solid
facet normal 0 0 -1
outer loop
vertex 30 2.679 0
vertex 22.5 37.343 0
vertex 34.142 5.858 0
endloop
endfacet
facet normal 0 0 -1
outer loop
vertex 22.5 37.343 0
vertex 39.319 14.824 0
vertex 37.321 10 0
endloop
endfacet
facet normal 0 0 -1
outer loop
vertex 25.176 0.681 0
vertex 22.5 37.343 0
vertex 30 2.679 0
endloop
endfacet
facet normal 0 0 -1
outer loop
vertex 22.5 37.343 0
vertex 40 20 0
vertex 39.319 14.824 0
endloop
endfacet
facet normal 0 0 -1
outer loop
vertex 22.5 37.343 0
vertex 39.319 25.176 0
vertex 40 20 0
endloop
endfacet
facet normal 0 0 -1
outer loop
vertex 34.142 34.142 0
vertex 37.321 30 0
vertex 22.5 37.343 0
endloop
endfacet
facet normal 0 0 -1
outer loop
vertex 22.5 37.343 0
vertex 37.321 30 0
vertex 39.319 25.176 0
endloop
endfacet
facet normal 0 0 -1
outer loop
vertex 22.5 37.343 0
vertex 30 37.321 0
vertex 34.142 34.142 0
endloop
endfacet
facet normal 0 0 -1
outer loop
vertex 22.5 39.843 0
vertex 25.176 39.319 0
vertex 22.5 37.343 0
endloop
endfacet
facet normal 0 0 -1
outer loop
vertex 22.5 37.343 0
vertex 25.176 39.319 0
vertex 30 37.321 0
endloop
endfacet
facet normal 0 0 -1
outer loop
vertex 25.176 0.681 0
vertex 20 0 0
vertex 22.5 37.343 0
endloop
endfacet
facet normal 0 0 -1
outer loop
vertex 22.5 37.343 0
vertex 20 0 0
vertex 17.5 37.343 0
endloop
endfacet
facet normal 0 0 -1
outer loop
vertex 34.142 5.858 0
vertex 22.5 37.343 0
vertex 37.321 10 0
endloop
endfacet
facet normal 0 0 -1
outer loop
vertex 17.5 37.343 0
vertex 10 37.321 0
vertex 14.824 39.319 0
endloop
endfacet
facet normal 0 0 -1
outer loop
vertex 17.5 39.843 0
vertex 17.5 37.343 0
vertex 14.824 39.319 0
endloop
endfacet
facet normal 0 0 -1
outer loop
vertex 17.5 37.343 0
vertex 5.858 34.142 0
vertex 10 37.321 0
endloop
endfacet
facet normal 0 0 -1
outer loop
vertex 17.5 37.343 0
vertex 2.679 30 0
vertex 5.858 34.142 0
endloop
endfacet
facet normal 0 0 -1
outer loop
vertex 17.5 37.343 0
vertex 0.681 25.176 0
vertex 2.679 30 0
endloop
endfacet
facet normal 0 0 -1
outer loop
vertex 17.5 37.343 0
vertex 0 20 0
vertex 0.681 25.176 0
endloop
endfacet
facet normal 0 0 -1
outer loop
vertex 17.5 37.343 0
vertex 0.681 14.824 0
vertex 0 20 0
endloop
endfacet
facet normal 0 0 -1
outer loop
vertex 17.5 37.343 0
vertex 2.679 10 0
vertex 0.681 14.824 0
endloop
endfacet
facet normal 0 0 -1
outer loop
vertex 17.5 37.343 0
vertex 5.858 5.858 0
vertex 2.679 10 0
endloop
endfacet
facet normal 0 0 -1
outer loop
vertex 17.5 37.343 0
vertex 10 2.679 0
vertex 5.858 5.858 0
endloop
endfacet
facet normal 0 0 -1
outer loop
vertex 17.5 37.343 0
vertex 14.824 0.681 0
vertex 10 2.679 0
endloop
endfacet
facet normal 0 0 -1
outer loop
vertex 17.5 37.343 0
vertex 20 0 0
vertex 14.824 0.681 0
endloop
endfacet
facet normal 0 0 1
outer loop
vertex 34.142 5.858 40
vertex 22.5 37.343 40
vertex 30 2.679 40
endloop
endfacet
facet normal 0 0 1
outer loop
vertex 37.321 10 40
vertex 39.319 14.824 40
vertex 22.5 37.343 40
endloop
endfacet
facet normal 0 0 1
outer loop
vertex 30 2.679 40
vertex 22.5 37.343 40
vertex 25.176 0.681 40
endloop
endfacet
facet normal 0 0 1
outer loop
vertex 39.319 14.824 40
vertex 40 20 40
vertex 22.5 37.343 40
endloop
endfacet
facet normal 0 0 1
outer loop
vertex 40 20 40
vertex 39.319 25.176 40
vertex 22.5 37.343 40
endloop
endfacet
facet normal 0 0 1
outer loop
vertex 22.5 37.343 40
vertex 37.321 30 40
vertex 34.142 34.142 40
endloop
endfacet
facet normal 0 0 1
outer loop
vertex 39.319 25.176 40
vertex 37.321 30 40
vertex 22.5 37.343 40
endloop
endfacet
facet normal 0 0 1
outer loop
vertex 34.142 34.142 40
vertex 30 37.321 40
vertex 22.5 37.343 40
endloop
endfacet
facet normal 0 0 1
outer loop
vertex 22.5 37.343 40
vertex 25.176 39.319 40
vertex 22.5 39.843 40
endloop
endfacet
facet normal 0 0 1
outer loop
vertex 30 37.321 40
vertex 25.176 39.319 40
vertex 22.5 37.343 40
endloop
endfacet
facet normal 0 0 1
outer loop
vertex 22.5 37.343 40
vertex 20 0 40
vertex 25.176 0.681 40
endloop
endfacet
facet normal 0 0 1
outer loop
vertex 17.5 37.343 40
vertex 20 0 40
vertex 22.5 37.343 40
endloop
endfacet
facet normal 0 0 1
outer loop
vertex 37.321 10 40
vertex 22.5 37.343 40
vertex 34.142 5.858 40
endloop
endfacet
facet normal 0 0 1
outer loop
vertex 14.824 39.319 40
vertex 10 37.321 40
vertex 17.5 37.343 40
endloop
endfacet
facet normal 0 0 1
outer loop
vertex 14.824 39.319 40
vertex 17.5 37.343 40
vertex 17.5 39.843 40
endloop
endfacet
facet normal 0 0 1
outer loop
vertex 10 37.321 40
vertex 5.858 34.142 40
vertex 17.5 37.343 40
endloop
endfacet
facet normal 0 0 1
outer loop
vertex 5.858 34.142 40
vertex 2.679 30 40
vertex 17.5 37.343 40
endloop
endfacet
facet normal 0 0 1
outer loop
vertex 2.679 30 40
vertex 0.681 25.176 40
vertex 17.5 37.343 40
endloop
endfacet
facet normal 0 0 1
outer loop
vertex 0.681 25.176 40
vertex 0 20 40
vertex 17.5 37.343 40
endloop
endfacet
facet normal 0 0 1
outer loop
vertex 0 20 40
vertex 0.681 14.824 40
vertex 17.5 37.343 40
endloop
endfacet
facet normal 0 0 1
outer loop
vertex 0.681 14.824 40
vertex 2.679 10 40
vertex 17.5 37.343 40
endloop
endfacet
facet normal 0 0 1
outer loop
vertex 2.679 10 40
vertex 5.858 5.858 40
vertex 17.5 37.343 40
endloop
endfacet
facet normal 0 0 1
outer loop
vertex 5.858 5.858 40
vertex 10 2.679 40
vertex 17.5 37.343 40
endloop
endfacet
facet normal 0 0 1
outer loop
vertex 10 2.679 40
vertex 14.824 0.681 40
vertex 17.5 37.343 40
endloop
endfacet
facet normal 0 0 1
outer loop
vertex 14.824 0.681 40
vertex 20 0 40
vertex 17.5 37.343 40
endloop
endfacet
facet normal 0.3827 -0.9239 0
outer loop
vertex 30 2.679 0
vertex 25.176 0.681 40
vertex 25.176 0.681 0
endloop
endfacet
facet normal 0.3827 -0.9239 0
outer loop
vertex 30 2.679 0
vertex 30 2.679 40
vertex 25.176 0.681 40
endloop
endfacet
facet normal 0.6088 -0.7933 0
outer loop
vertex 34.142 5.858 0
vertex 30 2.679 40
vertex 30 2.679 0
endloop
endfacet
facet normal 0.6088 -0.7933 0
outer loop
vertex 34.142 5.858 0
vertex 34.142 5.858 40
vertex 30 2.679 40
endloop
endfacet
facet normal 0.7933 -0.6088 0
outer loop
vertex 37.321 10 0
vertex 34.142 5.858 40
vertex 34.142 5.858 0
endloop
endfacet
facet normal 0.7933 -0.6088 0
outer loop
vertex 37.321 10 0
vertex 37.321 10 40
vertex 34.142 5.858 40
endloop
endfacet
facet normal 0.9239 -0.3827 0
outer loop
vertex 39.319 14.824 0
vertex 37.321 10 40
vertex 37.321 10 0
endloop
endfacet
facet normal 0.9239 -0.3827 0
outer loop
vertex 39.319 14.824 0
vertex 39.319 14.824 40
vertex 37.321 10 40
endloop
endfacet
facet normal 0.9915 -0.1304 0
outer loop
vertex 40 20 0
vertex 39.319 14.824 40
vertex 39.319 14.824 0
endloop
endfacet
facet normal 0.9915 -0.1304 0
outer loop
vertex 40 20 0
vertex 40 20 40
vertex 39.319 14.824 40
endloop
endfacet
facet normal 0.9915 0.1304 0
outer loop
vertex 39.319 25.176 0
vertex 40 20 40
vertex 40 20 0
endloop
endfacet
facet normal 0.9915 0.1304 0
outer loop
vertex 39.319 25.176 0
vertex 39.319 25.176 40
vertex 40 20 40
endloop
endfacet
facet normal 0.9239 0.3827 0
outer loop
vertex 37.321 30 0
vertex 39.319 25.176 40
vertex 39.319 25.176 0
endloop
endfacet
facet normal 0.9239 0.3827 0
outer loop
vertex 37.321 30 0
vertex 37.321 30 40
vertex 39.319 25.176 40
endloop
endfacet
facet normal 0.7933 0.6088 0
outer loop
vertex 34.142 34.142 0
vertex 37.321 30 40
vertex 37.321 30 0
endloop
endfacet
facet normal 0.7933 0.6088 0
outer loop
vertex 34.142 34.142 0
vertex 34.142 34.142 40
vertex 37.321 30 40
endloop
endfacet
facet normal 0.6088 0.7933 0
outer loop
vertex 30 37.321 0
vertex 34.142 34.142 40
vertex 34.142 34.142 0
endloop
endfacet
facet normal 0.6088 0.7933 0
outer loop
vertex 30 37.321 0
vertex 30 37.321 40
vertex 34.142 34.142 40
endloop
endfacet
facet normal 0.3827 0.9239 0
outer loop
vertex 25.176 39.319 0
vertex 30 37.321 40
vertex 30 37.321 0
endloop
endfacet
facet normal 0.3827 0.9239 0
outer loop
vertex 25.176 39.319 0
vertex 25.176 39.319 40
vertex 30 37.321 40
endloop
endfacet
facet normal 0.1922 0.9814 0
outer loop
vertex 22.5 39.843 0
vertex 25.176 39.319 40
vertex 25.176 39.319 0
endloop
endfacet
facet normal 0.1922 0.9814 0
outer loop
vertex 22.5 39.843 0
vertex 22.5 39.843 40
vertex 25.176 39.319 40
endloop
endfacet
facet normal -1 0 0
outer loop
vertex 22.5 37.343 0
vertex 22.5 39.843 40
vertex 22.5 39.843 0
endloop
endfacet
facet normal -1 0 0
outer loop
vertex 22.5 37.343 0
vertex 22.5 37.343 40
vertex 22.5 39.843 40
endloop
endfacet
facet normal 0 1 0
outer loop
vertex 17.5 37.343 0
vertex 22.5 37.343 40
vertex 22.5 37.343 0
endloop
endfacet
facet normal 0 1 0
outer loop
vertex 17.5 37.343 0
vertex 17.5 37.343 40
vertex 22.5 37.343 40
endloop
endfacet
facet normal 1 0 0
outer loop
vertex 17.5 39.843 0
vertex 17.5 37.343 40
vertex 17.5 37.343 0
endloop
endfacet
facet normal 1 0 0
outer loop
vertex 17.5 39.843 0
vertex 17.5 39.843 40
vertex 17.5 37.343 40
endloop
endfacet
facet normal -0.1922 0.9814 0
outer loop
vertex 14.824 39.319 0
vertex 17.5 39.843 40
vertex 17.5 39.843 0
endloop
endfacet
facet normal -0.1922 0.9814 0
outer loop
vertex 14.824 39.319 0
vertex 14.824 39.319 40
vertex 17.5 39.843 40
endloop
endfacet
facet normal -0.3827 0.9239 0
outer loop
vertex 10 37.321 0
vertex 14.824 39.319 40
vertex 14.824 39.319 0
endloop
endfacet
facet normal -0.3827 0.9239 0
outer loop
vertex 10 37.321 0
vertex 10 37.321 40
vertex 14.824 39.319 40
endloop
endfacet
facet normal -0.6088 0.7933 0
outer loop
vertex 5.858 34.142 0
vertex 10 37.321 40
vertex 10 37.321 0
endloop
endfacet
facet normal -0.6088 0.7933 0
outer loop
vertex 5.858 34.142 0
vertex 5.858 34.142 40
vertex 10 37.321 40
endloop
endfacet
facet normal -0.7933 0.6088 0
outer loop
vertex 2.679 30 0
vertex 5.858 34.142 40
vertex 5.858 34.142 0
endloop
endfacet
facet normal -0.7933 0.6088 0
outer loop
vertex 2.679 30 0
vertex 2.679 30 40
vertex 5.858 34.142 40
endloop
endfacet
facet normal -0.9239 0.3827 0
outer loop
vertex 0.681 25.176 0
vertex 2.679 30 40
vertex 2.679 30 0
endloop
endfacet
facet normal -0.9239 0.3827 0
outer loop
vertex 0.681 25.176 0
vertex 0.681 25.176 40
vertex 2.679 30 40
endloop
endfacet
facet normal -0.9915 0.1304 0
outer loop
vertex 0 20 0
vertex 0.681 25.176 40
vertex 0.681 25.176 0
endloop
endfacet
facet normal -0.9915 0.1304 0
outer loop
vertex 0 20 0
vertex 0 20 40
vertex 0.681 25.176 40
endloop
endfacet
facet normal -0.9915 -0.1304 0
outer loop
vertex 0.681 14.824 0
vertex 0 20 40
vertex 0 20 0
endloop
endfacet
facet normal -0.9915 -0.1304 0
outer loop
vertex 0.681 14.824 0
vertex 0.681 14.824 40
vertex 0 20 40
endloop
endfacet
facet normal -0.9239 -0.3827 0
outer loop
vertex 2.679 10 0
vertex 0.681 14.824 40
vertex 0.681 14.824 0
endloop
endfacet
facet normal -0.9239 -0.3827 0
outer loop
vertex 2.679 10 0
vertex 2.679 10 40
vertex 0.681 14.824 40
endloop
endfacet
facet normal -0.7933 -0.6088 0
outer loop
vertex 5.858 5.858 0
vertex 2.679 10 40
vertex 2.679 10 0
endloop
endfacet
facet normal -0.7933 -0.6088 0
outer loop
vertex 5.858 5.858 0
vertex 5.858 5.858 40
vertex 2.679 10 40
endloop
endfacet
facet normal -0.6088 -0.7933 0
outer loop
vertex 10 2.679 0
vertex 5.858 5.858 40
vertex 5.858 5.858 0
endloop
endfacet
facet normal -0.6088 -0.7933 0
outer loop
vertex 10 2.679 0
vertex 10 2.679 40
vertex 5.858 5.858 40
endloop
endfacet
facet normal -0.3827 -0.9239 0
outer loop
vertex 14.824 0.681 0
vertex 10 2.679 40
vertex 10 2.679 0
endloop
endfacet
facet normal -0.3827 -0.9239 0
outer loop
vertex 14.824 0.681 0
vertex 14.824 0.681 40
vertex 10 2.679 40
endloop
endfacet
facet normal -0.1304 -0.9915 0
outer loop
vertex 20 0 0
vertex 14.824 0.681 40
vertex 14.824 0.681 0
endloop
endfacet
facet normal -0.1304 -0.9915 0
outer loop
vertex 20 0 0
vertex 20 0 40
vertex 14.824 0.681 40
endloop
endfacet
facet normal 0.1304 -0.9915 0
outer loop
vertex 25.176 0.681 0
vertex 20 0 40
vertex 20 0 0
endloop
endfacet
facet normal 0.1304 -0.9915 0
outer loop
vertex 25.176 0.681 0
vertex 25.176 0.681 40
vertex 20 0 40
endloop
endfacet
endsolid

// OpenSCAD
$fn = 32;

// ----------------------------------------------------------------------
// Keyway shaft: d40 shaft, key 5 x 2.5 mm
// ----------------------------------------------------------------------

// --- parameters (mm) ---
shaft_r = 20;             // shaft radius
key_w = 5;                // keyway width
key_d = 2.5;              // keyway depth below the surface line
plate_t = 40;             // shaft length, Z (extrusion height)

shaft_d = 2 * shaft_r;  // shaft diameter
circle_step = 15;  // polygon sampling step, degrees

profile = [[14.824, 39.319], [10, 37.321], [5.858, 34.142], [2.679, 30], [0.681, 25.176], [0, 20], [0.681, 14.824], [2.679, 10], [5.858, 5.858], [10, 2.679], [14.824, 0.681], [20, 0], [25.176, 0.681], [30, 2.679], [34.142, 5.858], [37.321, 10], [39.319, 14.824], [40, 20], [39.319, 25.176], [37.321, 30], [34.142, 34.142], [30, 37.321], [25.176, 39.319], [22.5, 39.843], [22.5, 37.343], [17.5, 37.343], [17.5, 39.843]];  // primary outline, 27 points, counter clockwise

// --- the one profile operation ---
linear_extrude(height = plate_t) polygon(points = profile);
